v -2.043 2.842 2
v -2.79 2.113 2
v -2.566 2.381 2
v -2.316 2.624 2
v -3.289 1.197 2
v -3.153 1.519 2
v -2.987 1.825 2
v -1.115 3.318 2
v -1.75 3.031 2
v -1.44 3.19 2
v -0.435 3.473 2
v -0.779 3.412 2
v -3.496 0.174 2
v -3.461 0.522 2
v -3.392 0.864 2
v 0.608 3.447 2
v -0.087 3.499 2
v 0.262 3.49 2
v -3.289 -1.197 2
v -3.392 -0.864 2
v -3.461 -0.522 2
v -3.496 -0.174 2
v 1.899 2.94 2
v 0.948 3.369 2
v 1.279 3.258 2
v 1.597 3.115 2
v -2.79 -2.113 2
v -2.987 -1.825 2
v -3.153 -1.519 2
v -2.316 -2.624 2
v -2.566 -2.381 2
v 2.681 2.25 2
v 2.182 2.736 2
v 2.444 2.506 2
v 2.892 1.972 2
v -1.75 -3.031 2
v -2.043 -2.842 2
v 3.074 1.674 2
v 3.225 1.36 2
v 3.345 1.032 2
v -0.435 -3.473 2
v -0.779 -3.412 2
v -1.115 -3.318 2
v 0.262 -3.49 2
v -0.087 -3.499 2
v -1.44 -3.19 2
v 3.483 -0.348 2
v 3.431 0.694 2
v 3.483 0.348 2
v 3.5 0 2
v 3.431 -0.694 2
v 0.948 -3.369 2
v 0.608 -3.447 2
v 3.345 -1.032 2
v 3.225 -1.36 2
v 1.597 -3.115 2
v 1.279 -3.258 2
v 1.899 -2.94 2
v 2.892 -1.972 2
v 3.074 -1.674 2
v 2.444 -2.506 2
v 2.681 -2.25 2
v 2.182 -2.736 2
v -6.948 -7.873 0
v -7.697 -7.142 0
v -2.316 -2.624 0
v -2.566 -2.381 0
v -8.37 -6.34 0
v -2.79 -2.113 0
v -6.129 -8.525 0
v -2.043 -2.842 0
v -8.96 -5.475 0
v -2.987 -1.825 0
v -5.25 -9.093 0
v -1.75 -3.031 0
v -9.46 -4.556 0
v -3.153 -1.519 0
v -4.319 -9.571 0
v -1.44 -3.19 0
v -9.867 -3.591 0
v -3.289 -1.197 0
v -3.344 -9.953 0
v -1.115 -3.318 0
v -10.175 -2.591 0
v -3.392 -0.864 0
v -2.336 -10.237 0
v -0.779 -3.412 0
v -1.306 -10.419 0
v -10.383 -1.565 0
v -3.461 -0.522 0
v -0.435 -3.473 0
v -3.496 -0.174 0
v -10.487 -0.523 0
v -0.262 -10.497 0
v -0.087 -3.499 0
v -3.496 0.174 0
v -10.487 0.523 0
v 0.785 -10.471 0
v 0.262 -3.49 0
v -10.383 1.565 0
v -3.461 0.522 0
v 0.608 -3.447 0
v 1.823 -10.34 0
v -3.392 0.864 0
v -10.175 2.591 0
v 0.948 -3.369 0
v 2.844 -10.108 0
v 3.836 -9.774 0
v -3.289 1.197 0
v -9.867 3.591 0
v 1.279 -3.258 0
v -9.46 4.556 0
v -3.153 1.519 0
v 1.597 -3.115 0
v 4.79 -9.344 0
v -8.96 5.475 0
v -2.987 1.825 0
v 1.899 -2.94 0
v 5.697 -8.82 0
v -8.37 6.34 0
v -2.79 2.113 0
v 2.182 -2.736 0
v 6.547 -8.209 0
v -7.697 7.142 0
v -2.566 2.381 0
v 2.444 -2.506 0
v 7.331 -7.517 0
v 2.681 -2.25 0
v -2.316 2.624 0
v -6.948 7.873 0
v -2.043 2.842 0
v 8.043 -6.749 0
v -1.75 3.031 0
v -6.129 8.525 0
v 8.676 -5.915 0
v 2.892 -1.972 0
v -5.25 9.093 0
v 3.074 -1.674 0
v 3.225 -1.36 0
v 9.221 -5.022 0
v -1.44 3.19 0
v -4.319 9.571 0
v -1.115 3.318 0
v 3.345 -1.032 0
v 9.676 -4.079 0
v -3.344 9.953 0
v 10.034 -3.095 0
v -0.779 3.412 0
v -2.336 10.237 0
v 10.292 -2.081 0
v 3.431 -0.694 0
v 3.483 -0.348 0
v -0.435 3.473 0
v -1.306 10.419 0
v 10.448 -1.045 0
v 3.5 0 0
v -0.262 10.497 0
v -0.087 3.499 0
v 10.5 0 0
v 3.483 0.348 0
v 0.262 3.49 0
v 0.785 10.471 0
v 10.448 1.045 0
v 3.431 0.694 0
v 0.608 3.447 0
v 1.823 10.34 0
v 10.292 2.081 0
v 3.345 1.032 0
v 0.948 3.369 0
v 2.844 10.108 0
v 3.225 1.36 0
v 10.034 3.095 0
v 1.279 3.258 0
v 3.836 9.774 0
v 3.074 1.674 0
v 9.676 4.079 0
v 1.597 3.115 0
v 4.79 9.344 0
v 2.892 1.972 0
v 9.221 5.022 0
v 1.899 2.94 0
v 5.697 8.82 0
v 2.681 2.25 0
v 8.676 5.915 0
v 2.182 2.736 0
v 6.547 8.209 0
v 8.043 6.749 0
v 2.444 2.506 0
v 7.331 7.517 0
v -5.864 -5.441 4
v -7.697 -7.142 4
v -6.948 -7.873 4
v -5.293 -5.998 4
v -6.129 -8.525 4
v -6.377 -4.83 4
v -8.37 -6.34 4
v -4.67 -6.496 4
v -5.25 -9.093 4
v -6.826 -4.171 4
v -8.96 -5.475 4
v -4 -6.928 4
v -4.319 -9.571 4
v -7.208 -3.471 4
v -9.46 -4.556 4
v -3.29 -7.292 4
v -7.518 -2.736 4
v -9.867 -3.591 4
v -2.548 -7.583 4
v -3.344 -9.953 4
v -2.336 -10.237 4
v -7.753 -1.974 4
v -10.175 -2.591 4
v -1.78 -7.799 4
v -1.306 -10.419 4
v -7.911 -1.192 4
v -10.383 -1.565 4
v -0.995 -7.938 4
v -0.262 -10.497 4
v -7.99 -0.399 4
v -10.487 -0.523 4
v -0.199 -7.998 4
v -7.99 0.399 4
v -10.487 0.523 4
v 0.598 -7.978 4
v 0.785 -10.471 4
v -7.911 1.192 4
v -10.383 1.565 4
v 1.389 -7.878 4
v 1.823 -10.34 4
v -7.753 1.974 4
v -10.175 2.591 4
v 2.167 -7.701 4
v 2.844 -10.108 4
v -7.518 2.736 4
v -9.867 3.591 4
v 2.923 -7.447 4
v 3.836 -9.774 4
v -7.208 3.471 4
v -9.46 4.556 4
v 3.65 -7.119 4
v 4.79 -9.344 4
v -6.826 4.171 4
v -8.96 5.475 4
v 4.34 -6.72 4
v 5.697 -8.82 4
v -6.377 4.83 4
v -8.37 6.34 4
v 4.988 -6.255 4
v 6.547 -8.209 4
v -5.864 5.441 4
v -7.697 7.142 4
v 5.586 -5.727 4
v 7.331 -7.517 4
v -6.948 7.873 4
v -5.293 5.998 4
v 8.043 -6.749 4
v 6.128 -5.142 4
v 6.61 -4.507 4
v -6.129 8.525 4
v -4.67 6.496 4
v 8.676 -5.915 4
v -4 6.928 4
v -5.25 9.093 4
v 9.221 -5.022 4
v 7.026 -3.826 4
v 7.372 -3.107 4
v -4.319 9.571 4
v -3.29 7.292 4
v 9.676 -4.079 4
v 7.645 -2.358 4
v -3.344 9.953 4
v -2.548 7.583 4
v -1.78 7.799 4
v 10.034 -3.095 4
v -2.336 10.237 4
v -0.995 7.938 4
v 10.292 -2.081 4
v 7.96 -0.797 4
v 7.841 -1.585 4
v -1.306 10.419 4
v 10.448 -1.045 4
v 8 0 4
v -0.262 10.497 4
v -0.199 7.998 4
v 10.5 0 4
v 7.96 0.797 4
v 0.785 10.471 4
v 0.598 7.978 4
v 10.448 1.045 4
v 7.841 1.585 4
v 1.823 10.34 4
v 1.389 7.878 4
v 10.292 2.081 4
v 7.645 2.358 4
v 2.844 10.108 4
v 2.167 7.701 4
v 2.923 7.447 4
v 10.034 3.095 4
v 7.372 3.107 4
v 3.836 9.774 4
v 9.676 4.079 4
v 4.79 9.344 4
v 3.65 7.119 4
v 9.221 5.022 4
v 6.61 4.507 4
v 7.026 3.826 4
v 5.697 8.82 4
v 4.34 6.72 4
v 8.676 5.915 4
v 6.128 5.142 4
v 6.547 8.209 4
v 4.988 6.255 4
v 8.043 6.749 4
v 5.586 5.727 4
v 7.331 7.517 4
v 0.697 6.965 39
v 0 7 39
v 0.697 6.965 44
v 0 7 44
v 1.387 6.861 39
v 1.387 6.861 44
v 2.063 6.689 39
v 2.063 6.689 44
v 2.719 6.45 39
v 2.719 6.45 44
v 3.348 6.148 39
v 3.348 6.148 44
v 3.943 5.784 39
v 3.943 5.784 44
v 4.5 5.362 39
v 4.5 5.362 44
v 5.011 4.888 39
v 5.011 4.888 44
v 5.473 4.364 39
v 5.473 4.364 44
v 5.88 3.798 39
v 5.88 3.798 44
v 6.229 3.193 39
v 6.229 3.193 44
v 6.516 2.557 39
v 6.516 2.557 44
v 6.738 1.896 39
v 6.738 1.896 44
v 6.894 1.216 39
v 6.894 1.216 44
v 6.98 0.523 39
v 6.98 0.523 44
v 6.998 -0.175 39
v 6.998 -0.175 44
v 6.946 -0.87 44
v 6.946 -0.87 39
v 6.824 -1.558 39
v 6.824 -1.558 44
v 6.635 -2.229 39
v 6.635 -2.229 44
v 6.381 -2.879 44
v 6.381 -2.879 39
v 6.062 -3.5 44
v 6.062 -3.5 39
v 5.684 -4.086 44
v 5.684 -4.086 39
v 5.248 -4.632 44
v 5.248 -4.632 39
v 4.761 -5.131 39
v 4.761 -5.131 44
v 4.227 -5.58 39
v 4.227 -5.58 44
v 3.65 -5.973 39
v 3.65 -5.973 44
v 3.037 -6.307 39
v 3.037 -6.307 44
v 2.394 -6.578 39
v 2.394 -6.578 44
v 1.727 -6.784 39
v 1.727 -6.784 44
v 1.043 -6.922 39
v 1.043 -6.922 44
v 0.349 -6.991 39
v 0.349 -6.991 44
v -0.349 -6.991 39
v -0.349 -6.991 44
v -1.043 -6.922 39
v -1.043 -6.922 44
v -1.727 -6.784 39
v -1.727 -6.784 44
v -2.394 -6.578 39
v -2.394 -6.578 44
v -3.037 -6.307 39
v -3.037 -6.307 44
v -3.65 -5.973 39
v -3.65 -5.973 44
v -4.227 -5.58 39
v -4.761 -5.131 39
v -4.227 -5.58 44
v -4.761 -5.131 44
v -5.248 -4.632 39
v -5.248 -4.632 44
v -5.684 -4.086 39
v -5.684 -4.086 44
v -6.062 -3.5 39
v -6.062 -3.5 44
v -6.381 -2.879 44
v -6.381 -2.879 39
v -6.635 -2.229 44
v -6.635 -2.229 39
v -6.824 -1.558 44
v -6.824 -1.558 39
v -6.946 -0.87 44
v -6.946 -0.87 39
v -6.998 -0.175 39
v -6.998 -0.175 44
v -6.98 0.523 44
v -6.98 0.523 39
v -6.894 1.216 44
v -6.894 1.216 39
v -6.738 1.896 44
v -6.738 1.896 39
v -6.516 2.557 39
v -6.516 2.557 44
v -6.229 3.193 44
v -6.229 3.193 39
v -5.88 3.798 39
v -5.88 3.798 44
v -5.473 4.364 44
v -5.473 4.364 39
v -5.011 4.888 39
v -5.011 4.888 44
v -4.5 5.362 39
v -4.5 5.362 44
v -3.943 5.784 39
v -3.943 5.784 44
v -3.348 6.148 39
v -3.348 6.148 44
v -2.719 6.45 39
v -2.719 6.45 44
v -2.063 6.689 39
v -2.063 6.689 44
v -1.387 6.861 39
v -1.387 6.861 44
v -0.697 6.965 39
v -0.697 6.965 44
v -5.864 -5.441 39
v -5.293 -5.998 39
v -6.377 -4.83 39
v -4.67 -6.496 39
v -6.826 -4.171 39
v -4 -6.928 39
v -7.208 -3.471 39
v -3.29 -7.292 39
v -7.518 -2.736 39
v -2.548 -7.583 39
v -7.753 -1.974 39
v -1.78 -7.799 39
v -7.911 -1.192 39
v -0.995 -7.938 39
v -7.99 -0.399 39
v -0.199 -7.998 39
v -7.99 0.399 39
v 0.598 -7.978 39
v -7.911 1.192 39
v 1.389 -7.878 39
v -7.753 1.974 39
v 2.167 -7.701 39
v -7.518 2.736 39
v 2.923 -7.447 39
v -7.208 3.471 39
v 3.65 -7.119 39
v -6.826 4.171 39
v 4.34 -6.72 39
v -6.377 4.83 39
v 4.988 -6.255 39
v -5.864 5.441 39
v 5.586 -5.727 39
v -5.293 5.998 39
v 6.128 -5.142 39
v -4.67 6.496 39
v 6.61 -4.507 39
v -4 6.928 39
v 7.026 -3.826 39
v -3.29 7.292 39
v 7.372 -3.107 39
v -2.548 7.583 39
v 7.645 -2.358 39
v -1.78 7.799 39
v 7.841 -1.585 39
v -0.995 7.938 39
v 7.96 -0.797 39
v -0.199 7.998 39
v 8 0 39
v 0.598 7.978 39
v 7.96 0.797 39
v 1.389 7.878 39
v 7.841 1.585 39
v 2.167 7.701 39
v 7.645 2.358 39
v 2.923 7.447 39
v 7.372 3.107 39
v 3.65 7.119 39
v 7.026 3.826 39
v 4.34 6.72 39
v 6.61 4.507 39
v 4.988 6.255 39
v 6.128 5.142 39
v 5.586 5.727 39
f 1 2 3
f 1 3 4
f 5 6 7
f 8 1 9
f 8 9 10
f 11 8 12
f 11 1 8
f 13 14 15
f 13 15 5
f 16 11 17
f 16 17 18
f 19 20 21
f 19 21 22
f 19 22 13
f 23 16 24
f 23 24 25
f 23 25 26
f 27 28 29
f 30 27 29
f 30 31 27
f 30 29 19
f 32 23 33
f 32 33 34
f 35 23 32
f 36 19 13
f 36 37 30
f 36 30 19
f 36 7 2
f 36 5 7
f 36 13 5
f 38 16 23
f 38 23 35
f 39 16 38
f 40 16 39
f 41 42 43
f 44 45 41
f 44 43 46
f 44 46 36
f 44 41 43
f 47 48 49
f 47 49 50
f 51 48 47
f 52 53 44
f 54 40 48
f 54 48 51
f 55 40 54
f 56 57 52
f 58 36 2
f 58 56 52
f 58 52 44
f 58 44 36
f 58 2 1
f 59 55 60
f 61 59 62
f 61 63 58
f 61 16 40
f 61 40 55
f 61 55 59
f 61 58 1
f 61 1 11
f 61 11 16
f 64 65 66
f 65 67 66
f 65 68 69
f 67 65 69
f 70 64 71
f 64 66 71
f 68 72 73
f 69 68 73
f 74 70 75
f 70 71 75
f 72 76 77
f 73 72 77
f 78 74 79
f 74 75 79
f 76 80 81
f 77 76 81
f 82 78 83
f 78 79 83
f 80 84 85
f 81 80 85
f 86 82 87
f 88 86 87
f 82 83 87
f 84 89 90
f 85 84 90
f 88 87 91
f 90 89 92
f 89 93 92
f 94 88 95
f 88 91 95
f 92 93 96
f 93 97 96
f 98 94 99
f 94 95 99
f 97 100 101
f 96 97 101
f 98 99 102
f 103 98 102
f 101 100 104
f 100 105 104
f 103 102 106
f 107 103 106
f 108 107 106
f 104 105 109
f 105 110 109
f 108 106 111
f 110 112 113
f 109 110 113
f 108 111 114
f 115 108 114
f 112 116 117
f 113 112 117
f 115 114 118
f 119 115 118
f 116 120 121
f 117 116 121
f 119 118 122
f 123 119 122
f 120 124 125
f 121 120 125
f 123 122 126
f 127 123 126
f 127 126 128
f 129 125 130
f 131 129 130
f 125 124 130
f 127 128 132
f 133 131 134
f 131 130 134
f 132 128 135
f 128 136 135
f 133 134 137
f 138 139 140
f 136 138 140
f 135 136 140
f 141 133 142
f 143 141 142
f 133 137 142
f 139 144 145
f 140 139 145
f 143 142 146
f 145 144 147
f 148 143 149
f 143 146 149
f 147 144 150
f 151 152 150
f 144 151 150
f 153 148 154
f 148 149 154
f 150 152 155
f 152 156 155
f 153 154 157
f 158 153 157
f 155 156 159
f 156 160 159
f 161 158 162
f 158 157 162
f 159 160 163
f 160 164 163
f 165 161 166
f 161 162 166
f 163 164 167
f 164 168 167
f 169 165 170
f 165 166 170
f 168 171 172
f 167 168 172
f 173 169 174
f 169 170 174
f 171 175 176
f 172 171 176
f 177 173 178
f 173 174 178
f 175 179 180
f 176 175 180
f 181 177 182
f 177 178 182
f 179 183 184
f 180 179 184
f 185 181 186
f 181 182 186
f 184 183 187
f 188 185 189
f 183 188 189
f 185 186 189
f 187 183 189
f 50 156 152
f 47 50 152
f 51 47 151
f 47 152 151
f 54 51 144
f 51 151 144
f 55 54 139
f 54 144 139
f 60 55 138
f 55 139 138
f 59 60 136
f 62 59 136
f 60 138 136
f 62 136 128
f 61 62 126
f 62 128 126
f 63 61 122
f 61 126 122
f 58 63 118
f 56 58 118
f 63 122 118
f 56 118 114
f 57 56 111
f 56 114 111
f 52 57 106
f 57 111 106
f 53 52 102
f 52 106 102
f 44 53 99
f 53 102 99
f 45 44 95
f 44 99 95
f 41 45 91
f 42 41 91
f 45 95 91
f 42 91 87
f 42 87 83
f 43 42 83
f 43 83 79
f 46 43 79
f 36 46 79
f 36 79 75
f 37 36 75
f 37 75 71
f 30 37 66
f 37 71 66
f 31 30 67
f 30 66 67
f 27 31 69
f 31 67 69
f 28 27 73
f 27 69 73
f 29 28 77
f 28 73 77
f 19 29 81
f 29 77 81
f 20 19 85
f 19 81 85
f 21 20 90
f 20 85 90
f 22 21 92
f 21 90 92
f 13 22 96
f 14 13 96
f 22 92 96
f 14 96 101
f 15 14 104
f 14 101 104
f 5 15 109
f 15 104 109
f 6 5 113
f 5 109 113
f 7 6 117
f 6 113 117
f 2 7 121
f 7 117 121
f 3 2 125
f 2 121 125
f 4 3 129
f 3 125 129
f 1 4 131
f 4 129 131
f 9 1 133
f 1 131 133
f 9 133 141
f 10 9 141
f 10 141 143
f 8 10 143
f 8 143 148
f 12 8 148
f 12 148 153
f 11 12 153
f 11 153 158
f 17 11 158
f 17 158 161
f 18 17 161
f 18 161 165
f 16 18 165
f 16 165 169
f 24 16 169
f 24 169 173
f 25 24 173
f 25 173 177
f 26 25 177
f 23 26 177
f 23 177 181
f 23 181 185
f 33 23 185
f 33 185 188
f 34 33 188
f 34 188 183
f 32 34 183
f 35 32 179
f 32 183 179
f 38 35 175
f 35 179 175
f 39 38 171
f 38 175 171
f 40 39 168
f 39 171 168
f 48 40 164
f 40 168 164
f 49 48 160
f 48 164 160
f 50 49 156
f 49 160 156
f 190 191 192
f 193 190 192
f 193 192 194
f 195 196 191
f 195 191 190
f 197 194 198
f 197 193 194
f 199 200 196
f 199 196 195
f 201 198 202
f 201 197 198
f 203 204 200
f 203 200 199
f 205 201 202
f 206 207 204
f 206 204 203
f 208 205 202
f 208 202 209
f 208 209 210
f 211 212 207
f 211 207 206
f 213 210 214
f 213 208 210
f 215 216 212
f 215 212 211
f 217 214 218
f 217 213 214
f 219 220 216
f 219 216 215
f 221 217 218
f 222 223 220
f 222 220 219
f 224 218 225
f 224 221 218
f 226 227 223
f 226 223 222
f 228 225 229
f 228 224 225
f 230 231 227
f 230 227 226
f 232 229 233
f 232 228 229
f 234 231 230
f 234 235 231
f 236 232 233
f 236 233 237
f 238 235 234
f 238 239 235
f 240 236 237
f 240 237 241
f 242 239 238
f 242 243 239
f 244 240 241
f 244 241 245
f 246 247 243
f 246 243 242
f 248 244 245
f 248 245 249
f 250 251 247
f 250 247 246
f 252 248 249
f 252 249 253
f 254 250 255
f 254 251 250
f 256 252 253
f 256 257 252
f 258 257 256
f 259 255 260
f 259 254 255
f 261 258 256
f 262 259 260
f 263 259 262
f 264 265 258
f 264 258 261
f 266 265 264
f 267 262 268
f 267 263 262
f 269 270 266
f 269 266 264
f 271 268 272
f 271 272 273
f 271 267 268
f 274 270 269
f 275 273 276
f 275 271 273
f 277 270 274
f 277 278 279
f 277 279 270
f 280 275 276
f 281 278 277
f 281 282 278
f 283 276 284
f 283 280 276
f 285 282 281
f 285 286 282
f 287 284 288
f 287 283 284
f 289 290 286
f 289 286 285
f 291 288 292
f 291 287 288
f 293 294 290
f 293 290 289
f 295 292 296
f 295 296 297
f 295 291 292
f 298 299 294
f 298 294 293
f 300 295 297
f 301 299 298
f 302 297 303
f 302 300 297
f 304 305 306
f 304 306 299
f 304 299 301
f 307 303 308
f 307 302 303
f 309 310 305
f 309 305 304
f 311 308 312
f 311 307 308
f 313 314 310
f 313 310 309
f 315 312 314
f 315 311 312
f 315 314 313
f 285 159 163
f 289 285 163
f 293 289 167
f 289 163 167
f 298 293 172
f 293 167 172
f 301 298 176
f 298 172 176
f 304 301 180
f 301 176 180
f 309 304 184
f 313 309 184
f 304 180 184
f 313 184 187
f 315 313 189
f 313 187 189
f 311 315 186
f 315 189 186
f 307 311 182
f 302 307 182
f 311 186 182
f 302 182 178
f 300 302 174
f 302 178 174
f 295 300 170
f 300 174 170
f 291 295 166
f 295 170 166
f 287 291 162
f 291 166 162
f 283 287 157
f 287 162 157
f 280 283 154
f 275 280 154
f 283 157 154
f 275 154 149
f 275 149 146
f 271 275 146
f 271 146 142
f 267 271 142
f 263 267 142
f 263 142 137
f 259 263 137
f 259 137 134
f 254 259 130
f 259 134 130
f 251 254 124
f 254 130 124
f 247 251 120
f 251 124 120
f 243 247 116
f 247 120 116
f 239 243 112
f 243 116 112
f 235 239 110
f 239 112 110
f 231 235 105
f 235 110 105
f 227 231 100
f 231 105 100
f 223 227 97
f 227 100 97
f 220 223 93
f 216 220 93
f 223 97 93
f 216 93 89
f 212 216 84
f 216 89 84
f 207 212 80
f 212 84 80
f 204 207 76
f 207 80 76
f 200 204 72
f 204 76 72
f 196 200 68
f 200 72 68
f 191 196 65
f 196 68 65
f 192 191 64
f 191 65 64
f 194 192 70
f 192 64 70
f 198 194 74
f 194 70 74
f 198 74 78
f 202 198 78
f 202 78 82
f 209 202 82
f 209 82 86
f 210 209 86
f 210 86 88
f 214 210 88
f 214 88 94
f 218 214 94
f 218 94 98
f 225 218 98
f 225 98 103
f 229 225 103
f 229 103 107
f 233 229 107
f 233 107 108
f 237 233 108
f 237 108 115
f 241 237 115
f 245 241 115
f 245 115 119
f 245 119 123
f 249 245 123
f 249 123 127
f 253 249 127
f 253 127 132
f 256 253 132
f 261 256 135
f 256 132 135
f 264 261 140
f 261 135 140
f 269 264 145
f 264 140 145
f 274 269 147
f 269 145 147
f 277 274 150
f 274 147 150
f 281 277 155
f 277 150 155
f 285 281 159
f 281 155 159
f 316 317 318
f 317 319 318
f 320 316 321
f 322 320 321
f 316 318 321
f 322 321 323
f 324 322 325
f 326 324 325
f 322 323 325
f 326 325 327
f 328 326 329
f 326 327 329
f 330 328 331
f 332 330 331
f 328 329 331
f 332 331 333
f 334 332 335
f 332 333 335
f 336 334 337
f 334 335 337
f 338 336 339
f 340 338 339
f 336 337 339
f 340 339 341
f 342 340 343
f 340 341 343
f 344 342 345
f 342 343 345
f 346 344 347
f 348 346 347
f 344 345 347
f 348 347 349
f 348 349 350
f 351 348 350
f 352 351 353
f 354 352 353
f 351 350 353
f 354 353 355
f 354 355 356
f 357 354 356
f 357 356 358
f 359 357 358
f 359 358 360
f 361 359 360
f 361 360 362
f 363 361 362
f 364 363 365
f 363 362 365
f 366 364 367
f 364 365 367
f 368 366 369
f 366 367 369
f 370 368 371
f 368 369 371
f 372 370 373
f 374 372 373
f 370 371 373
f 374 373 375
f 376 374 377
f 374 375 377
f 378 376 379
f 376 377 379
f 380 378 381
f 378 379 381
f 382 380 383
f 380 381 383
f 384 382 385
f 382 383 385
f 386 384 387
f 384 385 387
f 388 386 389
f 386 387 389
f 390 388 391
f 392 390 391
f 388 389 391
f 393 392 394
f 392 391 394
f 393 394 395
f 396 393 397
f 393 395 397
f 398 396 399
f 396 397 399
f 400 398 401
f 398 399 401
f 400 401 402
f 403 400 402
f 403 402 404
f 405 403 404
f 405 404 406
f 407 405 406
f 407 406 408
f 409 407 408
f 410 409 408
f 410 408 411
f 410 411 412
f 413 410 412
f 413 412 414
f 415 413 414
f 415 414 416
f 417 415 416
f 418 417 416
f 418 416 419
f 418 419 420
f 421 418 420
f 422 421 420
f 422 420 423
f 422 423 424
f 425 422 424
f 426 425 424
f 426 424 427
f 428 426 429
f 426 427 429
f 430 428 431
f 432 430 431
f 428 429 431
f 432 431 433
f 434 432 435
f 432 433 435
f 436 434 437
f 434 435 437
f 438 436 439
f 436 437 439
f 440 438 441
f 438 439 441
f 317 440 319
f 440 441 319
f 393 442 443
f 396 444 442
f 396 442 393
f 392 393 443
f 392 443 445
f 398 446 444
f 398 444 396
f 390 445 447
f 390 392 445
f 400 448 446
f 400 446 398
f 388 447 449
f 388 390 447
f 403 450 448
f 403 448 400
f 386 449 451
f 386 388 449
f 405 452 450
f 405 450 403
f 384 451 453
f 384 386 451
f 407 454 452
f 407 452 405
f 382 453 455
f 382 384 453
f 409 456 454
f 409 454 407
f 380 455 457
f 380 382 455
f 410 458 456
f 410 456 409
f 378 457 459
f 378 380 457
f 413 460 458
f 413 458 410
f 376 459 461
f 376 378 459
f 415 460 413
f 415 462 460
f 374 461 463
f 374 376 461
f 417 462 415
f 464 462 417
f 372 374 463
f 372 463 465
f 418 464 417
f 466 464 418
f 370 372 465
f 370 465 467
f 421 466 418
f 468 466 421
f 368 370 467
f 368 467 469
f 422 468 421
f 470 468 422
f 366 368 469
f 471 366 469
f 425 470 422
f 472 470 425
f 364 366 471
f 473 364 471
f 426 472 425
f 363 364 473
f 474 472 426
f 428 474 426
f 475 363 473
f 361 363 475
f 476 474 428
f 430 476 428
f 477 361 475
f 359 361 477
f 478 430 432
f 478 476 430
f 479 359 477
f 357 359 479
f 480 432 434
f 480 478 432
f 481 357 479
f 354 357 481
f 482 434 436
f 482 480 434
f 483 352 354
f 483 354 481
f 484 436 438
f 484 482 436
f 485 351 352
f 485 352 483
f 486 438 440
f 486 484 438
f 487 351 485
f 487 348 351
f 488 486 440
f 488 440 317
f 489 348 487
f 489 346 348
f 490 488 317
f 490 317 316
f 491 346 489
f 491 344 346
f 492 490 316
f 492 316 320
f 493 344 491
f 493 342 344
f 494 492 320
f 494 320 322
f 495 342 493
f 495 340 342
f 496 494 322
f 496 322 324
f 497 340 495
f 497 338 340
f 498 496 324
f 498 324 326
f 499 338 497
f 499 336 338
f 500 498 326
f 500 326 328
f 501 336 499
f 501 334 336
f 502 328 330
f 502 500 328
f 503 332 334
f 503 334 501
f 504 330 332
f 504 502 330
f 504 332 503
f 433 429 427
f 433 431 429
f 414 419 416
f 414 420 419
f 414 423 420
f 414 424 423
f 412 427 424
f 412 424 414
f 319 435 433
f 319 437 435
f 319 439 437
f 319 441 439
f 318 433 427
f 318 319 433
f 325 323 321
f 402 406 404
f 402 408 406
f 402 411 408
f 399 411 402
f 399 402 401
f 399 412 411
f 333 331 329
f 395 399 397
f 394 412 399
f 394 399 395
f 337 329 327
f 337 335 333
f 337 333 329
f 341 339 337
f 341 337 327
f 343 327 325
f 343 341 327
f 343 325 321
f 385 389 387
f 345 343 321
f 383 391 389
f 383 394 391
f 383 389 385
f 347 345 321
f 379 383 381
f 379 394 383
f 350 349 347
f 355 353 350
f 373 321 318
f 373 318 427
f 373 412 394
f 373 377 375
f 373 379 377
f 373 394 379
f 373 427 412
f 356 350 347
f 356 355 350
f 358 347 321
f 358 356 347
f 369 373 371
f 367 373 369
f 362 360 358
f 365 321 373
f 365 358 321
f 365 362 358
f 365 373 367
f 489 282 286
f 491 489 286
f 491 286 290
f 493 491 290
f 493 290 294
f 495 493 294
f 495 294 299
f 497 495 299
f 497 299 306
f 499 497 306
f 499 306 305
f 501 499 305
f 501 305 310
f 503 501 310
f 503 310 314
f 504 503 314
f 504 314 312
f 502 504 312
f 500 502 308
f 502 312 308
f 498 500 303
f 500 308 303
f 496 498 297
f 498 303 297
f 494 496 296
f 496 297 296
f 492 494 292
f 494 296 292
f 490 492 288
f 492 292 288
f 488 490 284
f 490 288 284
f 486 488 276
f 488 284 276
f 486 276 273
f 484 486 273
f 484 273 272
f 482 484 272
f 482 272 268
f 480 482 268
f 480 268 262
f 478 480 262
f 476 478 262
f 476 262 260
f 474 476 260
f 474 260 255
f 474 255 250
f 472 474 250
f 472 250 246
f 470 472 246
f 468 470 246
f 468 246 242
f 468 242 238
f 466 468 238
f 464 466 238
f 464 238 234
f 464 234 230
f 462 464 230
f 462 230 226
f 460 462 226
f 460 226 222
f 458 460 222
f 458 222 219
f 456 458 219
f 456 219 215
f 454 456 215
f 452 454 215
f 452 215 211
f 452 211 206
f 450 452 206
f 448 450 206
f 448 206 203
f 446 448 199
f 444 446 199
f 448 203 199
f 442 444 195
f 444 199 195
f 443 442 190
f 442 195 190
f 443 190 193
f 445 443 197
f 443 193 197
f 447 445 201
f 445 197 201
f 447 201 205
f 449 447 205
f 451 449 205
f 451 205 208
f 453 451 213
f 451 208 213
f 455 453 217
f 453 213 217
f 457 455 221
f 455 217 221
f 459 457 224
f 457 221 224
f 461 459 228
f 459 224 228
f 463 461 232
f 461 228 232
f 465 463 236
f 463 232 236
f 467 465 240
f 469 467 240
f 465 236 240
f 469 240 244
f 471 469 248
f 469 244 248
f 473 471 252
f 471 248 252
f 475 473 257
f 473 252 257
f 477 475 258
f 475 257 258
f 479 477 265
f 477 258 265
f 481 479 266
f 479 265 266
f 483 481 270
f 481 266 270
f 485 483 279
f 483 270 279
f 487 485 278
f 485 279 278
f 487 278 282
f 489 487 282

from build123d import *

# Parameters (mm, degrees)
F0_R     = 10.5
F1_DEPTH = 4
F2_R     = 8
F3_DEPTH = 39
F4_W     = 7
F4_H     = 5
F6_R     = 3.5
F7_DEPTH = 2


with BuildPart() as f1:
    # F0 (on Top) → F1 (new body)
    with BuildSketch(Plane.XY):
        Circle(F0_R)
    extrude(amount=F1_DEPTH)

    # F2 (on Top) → F3 (join)
    with BuildSketch(Plane.XY):
        Circle(F2_R)
    extrude(amount=F3_DEPTH)

    # F4 (on Right) → F5 (revolve)
    with BuildSketch(Plane.YZ):
        with Locations((3.5, 41.5)):
            Rectangle(F4_W, F4_H)
    revolve(axis=Axis((0, 0, 41.5), (0, 0, -1)))

    # F6 (on face) → F7 (cut)
    with BuildSketch(Plane(origin=(0, 0, 0), x_dir=(1, 0, 0), z_dir=(0, 0, -1))):
        Circle(F6_R)
    extrude(amount=-F7_DEPTH, mode=Mode.SUBTRACT)


solid = f1.part
